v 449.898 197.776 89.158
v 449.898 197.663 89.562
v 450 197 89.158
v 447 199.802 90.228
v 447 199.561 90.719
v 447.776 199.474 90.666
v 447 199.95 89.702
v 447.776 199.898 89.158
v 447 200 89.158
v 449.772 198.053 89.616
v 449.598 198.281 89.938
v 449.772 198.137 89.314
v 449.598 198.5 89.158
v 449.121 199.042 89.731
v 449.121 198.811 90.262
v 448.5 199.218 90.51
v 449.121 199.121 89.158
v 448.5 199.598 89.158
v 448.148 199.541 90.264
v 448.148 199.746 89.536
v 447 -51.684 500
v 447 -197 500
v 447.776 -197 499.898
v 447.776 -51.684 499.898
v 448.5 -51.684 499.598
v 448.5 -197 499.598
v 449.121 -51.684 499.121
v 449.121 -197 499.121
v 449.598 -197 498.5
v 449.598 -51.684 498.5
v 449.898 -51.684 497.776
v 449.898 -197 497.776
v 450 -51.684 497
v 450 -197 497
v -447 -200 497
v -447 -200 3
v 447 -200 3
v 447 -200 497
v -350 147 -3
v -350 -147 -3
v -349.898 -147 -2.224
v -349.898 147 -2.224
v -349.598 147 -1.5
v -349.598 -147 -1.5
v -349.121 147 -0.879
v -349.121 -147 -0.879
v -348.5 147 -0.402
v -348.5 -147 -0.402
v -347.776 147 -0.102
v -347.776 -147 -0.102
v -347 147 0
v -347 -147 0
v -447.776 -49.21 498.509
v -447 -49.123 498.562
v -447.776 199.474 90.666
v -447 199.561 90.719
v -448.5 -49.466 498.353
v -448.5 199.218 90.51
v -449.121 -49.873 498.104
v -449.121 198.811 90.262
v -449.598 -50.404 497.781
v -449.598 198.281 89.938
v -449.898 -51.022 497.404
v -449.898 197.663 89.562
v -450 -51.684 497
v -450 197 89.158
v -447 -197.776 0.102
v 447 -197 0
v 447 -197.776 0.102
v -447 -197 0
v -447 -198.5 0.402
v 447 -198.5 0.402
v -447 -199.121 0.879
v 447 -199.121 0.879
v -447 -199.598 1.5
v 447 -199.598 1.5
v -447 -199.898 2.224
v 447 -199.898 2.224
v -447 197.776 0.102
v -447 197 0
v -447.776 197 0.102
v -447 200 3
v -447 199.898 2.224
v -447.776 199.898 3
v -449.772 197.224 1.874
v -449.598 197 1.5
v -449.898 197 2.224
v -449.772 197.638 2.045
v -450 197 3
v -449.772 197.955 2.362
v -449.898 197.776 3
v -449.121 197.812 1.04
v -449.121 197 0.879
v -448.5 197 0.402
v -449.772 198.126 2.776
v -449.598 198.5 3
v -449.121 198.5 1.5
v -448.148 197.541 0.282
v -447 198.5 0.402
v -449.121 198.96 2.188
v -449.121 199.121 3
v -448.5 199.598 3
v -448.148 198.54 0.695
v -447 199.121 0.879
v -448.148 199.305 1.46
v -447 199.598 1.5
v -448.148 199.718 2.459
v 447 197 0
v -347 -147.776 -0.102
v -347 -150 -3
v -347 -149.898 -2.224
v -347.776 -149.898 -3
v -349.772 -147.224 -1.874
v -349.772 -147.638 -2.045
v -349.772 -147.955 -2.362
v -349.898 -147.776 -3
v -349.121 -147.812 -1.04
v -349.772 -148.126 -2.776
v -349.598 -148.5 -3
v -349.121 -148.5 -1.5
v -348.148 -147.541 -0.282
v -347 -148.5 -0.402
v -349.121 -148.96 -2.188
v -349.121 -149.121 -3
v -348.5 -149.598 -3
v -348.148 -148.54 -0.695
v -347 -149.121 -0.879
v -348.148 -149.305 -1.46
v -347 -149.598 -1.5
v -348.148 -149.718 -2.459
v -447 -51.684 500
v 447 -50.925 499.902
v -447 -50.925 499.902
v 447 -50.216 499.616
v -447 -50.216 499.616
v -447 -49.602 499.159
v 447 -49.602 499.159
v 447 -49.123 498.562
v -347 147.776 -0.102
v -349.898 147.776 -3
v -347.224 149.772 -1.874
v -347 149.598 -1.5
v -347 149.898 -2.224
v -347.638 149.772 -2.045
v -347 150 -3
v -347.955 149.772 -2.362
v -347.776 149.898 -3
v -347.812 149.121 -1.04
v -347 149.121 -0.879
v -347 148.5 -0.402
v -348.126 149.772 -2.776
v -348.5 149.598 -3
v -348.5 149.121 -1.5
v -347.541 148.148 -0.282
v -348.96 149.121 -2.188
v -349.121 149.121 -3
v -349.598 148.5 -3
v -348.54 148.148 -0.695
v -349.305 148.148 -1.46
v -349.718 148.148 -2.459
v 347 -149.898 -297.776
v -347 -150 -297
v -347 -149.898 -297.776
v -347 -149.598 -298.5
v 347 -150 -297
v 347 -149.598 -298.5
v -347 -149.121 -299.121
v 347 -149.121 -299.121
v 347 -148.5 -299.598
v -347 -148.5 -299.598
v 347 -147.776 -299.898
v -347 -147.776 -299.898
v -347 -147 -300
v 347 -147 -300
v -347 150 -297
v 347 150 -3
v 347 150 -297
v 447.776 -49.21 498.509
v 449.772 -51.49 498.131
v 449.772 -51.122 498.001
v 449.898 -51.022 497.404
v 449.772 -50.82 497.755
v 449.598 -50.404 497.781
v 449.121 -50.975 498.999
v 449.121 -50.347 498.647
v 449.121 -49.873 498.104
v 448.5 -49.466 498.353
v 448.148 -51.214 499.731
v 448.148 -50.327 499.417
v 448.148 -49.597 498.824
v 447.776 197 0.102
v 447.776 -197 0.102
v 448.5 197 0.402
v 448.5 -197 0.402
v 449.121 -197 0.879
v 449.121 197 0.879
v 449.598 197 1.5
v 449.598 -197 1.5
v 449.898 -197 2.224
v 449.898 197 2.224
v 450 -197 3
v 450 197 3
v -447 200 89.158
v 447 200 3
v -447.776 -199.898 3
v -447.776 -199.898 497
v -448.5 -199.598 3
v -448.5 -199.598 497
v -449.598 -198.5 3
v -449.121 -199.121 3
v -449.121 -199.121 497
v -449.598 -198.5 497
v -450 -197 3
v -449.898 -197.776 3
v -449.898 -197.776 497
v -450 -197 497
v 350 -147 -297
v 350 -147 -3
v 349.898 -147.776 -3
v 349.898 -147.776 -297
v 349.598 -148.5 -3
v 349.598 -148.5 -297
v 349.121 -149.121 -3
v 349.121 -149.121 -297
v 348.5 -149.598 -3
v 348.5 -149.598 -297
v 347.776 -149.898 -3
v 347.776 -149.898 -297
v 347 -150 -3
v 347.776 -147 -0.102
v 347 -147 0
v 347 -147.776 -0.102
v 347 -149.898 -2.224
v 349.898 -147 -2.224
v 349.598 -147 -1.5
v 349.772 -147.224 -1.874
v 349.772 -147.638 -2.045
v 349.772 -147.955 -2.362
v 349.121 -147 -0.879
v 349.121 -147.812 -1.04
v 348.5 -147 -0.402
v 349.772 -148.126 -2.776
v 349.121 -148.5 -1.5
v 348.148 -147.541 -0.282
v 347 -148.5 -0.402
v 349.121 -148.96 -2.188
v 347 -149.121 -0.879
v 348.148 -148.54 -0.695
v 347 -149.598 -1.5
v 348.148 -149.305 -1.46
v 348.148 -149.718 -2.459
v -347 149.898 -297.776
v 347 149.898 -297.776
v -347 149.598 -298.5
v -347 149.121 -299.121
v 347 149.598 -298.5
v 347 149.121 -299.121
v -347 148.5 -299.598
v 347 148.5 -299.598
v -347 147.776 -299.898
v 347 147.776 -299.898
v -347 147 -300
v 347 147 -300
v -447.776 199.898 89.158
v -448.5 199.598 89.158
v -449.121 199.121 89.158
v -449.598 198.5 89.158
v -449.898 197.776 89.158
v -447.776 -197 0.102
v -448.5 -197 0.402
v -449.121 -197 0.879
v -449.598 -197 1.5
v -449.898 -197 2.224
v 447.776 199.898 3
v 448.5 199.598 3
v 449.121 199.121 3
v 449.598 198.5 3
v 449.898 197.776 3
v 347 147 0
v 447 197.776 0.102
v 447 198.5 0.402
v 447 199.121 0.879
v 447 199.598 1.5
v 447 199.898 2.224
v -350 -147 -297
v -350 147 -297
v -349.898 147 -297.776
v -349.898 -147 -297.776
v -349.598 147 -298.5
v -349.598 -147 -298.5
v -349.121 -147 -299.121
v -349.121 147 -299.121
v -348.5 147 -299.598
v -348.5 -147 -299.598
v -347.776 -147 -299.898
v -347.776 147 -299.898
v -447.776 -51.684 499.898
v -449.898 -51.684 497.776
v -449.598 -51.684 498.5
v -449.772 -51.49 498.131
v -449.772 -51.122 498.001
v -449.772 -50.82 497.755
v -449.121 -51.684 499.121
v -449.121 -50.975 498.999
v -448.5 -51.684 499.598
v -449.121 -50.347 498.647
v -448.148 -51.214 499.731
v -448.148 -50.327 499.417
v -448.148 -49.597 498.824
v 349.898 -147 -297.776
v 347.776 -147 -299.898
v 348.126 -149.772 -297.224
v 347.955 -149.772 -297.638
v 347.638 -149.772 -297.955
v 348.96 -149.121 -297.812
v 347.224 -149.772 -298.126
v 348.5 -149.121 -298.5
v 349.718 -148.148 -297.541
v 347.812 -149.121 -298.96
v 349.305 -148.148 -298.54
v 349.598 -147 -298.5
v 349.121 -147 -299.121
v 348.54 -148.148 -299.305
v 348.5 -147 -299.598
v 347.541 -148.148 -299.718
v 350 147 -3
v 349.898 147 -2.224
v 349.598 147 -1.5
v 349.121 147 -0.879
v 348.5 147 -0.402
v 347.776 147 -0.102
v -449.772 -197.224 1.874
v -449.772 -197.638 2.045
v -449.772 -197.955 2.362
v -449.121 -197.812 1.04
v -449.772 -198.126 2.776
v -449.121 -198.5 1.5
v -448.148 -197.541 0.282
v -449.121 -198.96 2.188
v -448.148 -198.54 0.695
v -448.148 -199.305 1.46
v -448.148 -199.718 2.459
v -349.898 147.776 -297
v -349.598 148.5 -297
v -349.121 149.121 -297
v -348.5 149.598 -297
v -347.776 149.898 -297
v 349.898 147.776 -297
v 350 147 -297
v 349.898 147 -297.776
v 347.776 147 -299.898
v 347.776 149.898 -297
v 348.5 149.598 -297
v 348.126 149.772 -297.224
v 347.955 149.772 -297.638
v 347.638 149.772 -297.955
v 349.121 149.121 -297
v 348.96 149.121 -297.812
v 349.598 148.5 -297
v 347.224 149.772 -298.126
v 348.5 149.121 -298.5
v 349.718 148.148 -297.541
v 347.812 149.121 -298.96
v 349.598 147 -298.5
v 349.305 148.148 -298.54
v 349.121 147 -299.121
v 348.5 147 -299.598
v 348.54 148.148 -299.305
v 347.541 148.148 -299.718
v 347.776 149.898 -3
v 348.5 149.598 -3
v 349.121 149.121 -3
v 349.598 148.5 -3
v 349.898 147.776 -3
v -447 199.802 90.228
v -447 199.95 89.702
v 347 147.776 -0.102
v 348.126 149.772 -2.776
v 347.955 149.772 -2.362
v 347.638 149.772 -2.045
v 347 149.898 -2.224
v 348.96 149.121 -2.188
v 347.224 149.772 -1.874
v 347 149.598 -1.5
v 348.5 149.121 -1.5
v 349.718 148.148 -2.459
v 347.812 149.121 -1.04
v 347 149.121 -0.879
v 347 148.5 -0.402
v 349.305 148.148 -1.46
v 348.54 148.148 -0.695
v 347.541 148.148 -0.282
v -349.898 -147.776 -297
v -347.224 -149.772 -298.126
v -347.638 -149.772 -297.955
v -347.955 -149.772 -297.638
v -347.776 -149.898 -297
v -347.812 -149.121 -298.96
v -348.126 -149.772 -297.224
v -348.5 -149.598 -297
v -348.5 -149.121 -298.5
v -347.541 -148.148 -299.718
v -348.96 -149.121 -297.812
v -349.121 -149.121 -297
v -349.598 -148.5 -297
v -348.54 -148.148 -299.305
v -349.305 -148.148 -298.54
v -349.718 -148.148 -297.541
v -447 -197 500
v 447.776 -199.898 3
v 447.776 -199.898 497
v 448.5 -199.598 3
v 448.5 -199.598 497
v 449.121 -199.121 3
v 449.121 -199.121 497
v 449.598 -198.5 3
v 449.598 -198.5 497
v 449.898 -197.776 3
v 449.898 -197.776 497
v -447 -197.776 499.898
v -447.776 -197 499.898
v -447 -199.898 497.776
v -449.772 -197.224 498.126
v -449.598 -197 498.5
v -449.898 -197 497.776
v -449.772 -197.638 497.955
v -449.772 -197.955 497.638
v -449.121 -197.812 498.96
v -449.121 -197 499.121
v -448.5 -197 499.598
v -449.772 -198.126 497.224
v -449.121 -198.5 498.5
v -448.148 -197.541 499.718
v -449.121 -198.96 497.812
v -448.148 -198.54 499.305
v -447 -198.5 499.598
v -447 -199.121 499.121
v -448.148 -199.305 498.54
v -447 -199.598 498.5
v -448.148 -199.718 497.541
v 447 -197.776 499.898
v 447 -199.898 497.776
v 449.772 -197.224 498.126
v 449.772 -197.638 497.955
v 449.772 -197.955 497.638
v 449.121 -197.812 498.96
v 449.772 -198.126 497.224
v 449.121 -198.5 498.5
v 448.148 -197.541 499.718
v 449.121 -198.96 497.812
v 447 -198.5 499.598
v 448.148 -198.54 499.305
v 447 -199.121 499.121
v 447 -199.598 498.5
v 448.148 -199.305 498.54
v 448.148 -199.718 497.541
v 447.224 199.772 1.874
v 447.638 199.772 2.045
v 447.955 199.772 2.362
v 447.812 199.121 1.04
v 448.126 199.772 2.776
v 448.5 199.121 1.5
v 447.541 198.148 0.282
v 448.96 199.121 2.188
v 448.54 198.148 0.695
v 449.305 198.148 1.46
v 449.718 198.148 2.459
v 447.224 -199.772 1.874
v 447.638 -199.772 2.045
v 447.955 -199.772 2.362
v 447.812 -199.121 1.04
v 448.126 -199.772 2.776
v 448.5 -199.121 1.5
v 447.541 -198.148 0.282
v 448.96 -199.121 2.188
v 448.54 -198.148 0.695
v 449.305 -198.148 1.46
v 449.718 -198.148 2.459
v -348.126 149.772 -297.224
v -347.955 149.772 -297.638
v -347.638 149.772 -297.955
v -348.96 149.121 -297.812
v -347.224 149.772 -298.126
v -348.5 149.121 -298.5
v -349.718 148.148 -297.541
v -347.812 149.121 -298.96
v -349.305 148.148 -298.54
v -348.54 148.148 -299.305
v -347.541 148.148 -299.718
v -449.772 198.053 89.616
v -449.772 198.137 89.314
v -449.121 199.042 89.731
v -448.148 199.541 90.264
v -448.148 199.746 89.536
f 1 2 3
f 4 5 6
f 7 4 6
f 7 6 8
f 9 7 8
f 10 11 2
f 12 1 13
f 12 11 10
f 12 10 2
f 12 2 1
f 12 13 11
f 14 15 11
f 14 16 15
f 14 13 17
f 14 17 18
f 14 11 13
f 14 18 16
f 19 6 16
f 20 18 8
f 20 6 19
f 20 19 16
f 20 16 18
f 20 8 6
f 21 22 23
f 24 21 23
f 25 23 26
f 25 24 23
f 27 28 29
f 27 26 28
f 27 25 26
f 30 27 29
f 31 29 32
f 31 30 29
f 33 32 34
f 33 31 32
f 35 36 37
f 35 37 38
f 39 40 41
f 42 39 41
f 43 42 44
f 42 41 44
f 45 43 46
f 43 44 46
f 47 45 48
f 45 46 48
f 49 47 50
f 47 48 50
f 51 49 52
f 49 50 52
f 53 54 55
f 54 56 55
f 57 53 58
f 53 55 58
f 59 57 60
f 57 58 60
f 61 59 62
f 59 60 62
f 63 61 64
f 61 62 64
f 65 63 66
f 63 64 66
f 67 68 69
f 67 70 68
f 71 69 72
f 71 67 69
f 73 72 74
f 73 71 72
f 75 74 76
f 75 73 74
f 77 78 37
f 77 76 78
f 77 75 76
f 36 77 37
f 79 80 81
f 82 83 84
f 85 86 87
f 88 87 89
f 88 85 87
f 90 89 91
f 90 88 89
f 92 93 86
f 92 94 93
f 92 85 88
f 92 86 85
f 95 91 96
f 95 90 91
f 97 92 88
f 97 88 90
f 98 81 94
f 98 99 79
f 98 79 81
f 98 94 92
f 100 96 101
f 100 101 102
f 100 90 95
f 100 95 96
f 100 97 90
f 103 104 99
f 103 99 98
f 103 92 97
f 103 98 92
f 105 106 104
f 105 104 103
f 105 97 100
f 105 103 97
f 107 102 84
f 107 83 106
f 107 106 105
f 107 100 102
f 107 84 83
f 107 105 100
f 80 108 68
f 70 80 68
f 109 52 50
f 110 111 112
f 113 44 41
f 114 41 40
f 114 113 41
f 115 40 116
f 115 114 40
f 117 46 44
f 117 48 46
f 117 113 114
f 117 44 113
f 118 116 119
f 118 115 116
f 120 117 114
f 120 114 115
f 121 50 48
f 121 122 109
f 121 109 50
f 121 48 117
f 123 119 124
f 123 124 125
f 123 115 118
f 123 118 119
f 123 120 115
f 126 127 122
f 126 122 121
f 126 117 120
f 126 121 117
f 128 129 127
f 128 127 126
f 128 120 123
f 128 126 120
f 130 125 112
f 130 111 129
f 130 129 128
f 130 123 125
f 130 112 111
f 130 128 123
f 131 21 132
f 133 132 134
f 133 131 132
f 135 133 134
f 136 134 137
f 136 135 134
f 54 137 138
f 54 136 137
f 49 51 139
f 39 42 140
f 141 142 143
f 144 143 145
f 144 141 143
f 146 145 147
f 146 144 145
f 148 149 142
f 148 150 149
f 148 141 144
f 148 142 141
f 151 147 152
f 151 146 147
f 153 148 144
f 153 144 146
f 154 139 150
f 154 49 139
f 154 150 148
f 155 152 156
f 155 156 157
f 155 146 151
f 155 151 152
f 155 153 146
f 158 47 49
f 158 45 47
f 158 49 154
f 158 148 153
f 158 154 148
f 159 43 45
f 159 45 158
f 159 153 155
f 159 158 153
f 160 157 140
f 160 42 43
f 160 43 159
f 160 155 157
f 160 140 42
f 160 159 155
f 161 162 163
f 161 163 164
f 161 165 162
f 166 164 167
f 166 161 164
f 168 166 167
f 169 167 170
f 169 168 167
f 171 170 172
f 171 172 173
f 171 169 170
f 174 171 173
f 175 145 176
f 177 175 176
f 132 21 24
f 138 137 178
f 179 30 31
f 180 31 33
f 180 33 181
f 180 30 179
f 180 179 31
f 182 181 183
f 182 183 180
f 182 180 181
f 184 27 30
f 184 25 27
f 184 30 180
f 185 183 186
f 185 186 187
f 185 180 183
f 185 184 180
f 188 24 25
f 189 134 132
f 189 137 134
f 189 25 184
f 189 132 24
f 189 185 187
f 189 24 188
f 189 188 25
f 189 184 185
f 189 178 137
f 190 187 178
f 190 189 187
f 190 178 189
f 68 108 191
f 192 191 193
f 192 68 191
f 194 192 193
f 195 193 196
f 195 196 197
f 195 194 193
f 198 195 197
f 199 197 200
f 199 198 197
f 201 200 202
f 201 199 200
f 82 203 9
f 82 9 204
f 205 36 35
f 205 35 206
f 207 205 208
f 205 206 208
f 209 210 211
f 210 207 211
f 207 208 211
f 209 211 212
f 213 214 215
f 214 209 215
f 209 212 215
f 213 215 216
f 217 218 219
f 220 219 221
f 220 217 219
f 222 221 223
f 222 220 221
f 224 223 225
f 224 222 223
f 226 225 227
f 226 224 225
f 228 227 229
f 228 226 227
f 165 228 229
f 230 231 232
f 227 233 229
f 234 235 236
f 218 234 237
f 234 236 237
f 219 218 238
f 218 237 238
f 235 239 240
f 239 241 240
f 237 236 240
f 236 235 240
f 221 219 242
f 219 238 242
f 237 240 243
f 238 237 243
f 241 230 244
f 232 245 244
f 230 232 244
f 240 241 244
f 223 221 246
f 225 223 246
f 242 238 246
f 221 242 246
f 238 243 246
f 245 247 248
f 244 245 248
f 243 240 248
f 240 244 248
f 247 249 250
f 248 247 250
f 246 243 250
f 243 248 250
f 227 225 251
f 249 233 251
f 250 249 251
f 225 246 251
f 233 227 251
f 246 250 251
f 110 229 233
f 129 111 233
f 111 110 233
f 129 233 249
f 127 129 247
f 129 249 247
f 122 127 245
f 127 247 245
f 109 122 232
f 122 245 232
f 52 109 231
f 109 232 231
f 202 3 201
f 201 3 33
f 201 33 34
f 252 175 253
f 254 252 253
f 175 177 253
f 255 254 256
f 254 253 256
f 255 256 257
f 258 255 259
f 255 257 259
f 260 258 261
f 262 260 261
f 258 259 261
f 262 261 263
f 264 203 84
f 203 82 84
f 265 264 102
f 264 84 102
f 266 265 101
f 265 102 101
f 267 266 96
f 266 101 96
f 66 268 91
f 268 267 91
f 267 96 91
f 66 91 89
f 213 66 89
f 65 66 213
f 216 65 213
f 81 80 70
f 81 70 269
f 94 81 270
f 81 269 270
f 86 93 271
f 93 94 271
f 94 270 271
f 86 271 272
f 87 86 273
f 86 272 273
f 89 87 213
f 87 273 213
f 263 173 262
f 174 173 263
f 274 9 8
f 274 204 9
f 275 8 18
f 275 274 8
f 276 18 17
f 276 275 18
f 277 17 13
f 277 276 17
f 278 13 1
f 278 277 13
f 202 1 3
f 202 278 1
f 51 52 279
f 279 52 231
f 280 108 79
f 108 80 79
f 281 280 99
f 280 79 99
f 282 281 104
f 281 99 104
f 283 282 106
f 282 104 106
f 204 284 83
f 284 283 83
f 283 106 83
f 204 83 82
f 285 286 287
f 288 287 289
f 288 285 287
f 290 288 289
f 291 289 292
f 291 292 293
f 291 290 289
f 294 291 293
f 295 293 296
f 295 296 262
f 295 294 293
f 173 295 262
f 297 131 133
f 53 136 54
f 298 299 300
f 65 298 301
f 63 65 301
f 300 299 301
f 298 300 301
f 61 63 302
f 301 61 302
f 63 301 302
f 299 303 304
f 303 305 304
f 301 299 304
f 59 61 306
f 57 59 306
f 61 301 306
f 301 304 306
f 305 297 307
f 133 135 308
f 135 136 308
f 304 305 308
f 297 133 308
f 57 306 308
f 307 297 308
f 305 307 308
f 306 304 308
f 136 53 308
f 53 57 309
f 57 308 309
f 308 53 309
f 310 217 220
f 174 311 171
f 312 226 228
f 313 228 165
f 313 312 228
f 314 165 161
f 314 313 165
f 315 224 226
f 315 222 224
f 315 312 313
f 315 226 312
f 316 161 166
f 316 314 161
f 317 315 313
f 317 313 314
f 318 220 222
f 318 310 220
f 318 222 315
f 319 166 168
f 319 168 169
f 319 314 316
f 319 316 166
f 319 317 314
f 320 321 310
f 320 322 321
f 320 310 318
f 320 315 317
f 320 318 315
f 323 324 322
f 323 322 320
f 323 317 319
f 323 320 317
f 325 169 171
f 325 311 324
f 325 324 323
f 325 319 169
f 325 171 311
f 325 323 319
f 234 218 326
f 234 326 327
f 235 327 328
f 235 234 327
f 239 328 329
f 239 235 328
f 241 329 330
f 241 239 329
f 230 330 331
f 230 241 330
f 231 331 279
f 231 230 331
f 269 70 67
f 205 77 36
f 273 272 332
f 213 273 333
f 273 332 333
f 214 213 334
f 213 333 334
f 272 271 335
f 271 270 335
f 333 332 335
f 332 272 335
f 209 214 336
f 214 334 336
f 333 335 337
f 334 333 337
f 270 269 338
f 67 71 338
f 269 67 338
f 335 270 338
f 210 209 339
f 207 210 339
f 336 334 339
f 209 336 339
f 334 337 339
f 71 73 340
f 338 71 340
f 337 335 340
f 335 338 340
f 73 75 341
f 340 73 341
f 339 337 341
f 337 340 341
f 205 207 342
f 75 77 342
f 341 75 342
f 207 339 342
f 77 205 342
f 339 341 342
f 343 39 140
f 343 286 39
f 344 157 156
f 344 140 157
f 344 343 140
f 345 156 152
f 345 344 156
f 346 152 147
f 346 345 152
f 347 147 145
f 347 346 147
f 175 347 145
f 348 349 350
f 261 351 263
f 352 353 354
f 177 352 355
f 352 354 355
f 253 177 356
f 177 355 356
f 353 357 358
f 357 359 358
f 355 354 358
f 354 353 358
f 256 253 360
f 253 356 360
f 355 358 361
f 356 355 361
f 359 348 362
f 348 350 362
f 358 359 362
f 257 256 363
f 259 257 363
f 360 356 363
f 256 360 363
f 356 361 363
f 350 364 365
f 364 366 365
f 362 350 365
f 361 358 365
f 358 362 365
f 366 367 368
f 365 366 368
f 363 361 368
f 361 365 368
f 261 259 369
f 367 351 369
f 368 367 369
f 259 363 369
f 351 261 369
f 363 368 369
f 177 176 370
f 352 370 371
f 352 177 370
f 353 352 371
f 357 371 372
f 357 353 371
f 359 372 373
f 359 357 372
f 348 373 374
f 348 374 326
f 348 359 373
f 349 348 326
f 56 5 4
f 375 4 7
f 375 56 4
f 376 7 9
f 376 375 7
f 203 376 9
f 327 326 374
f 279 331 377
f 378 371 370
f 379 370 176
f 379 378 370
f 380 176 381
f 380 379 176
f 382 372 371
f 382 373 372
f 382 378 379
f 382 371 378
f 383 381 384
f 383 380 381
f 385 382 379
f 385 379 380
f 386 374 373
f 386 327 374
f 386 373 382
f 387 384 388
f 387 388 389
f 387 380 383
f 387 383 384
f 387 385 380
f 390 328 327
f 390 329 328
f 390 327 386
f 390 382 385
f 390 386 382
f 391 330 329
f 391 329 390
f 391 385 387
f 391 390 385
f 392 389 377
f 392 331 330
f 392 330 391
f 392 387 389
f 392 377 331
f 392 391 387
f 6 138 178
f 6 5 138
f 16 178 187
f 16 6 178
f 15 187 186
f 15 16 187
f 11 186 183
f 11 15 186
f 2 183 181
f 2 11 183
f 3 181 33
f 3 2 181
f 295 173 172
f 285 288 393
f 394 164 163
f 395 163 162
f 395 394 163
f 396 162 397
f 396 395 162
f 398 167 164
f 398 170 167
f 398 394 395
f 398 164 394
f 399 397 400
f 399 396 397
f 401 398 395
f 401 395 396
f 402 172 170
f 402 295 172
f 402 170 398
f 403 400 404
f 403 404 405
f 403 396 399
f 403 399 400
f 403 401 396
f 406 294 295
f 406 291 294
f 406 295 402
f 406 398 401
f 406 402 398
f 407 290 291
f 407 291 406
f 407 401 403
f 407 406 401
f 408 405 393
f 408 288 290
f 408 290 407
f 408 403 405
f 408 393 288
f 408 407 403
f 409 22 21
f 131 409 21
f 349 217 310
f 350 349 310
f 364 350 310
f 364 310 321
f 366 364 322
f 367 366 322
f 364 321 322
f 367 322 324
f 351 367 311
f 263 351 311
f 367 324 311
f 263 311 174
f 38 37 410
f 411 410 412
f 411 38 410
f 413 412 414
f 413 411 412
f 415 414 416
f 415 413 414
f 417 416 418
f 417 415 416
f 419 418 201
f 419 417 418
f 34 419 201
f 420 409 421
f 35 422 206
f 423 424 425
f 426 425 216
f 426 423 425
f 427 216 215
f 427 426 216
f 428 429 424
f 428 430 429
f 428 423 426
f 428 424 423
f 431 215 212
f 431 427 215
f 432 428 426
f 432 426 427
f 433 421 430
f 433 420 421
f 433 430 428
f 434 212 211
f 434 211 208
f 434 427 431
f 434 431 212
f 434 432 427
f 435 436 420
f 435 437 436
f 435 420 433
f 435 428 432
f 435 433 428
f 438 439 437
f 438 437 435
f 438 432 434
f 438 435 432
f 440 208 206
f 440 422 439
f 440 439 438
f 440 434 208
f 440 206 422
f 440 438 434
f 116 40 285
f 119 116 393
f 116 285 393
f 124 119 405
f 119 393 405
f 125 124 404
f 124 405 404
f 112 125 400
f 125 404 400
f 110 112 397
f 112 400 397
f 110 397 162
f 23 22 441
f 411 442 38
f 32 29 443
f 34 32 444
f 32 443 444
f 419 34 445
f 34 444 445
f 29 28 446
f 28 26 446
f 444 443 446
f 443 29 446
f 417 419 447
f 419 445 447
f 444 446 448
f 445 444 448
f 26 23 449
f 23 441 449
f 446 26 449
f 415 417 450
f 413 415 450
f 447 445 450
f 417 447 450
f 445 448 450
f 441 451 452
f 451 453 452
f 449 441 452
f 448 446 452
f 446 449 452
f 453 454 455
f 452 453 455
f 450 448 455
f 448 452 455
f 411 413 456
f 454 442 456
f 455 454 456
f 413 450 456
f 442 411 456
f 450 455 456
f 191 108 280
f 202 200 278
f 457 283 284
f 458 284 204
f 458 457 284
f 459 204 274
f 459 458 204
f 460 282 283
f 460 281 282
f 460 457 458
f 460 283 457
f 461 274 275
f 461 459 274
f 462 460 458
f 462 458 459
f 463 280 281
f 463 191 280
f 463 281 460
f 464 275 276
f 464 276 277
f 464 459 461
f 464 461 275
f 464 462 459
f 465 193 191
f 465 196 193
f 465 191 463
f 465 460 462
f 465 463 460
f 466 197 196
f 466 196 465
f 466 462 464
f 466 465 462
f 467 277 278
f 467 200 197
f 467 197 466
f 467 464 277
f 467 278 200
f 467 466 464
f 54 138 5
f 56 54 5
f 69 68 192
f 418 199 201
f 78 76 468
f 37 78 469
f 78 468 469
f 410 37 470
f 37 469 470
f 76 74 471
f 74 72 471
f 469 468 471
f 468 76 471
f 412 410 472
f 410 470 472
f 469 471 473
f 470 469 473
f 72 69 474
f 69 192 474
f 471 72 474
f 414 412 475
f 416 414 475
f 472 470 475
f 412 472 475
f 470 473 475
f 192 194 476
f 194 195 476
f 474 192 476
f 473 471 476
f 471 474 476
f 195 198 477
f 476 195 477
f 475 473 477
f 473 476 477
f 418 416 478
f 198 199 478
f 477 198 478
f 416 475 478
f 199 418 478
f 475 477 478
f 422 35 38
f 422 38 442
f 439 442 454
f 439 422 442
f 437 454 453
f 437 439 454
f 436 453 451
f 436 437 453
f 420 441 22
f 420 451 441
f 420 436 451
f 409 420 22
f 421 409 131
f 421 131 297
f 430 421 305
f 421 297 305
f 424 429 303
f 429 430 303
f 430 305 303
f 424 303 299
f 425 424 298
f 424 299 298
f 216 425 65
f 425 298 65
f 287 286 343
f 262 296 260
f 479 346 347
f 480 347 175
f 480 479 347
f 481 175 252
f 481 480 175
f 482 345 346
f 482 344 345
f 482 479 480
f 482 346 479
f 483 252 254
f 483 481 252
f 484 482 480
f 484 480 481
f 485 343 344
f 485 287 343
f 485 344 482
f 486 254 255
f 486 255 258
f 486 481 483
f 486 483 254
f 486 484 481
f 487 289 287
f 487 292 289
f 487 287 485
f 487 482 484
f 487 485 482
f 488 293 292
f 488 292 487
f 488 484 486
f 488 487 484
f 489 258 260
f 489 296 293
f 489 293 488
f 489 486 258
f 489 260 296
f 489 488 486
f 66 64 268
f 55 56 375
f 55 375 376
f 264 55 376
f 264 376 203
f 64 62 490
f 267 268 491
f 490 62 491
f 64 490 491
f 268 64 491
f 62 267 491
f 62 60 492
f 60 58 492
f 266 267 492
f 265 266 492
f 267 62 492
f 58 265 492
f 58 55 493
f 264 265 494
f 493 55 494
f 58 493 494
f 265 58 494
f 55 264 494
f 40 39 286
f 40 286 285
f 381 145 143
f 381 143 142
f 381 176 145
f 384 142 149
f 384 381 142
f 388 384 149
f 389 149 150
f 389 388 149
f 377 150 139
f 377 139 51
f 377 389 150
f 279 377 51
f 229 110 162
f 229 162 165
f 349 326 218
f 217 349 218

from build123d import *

# Parameters (mm, degrees)
F4_DEPTH = 900
F5_W     = 700
F5_H     = 300
F6_DEPTH = 300
F7_R     = 3
F8_R     = 3


with BuildPart() as f4:
    # F3 (on face) → F4 (new body, through all)
    with BuildSketch(Plane(origin=(450, 0, 0), x_dir=(0, -1, 0), z_dir=(-1, 0, 0))):
        Polygon((-200, 0), (200, 0), (200, 500), (50, 500), (-200, 90), align=None)
    extrude(amount=F4_DEPTH)

    # F7
    f7_edges = [f4.edges().sort_by_distance(p)[0] for p in [
        (0, 200, 90),
        (0, -50, 500),
        (0, -200, 500),
        (450, 0, 0),
        (0, 200, 0),
        (450, -125, 500),
        (-450, -125, 500),
        (450, 75, 295),
        (0, -200, 0),
        (-450, 0, 0),
        (450, -200, 250),
        (-450, -200, 250),
        (-450, 75, 295),
        (450, 200, 45),
        (-450, 200, 45),
    ]]
    fillet(f7_edges, radius=F7_R)


with BuildPart() as f6:
    # F5 (on face) → F6 (new body, through all)
    with BuildSketch(Plane(origin=(0, 0, 0), x_dir=(1, 0, 0), z_dir=(0, 0, -1))):
        Rectangle(F5_W, F5_H)
    extrude(amount=F6_DEPTH)

    # F8
    f8_edges = [f6.edges().sort_by_distance(p)[0] for p in [
        (0, -150, 0),
        (-350, 0, 0),
        (350, 0, 0),
        (350, 0, -300),
        (-350, 0, -300),
        (350, -150, -150),
        (350, 150, -150),
        (0, -150, -300),
        (0, 150, 0),
        (-350, 150, -150),
        (0, 150, -300),
        (-350, -150, -150),
    ]]
    fillet(f8_edges, radius=F8_R)


solid = Compound([f4.part, f6.part])
